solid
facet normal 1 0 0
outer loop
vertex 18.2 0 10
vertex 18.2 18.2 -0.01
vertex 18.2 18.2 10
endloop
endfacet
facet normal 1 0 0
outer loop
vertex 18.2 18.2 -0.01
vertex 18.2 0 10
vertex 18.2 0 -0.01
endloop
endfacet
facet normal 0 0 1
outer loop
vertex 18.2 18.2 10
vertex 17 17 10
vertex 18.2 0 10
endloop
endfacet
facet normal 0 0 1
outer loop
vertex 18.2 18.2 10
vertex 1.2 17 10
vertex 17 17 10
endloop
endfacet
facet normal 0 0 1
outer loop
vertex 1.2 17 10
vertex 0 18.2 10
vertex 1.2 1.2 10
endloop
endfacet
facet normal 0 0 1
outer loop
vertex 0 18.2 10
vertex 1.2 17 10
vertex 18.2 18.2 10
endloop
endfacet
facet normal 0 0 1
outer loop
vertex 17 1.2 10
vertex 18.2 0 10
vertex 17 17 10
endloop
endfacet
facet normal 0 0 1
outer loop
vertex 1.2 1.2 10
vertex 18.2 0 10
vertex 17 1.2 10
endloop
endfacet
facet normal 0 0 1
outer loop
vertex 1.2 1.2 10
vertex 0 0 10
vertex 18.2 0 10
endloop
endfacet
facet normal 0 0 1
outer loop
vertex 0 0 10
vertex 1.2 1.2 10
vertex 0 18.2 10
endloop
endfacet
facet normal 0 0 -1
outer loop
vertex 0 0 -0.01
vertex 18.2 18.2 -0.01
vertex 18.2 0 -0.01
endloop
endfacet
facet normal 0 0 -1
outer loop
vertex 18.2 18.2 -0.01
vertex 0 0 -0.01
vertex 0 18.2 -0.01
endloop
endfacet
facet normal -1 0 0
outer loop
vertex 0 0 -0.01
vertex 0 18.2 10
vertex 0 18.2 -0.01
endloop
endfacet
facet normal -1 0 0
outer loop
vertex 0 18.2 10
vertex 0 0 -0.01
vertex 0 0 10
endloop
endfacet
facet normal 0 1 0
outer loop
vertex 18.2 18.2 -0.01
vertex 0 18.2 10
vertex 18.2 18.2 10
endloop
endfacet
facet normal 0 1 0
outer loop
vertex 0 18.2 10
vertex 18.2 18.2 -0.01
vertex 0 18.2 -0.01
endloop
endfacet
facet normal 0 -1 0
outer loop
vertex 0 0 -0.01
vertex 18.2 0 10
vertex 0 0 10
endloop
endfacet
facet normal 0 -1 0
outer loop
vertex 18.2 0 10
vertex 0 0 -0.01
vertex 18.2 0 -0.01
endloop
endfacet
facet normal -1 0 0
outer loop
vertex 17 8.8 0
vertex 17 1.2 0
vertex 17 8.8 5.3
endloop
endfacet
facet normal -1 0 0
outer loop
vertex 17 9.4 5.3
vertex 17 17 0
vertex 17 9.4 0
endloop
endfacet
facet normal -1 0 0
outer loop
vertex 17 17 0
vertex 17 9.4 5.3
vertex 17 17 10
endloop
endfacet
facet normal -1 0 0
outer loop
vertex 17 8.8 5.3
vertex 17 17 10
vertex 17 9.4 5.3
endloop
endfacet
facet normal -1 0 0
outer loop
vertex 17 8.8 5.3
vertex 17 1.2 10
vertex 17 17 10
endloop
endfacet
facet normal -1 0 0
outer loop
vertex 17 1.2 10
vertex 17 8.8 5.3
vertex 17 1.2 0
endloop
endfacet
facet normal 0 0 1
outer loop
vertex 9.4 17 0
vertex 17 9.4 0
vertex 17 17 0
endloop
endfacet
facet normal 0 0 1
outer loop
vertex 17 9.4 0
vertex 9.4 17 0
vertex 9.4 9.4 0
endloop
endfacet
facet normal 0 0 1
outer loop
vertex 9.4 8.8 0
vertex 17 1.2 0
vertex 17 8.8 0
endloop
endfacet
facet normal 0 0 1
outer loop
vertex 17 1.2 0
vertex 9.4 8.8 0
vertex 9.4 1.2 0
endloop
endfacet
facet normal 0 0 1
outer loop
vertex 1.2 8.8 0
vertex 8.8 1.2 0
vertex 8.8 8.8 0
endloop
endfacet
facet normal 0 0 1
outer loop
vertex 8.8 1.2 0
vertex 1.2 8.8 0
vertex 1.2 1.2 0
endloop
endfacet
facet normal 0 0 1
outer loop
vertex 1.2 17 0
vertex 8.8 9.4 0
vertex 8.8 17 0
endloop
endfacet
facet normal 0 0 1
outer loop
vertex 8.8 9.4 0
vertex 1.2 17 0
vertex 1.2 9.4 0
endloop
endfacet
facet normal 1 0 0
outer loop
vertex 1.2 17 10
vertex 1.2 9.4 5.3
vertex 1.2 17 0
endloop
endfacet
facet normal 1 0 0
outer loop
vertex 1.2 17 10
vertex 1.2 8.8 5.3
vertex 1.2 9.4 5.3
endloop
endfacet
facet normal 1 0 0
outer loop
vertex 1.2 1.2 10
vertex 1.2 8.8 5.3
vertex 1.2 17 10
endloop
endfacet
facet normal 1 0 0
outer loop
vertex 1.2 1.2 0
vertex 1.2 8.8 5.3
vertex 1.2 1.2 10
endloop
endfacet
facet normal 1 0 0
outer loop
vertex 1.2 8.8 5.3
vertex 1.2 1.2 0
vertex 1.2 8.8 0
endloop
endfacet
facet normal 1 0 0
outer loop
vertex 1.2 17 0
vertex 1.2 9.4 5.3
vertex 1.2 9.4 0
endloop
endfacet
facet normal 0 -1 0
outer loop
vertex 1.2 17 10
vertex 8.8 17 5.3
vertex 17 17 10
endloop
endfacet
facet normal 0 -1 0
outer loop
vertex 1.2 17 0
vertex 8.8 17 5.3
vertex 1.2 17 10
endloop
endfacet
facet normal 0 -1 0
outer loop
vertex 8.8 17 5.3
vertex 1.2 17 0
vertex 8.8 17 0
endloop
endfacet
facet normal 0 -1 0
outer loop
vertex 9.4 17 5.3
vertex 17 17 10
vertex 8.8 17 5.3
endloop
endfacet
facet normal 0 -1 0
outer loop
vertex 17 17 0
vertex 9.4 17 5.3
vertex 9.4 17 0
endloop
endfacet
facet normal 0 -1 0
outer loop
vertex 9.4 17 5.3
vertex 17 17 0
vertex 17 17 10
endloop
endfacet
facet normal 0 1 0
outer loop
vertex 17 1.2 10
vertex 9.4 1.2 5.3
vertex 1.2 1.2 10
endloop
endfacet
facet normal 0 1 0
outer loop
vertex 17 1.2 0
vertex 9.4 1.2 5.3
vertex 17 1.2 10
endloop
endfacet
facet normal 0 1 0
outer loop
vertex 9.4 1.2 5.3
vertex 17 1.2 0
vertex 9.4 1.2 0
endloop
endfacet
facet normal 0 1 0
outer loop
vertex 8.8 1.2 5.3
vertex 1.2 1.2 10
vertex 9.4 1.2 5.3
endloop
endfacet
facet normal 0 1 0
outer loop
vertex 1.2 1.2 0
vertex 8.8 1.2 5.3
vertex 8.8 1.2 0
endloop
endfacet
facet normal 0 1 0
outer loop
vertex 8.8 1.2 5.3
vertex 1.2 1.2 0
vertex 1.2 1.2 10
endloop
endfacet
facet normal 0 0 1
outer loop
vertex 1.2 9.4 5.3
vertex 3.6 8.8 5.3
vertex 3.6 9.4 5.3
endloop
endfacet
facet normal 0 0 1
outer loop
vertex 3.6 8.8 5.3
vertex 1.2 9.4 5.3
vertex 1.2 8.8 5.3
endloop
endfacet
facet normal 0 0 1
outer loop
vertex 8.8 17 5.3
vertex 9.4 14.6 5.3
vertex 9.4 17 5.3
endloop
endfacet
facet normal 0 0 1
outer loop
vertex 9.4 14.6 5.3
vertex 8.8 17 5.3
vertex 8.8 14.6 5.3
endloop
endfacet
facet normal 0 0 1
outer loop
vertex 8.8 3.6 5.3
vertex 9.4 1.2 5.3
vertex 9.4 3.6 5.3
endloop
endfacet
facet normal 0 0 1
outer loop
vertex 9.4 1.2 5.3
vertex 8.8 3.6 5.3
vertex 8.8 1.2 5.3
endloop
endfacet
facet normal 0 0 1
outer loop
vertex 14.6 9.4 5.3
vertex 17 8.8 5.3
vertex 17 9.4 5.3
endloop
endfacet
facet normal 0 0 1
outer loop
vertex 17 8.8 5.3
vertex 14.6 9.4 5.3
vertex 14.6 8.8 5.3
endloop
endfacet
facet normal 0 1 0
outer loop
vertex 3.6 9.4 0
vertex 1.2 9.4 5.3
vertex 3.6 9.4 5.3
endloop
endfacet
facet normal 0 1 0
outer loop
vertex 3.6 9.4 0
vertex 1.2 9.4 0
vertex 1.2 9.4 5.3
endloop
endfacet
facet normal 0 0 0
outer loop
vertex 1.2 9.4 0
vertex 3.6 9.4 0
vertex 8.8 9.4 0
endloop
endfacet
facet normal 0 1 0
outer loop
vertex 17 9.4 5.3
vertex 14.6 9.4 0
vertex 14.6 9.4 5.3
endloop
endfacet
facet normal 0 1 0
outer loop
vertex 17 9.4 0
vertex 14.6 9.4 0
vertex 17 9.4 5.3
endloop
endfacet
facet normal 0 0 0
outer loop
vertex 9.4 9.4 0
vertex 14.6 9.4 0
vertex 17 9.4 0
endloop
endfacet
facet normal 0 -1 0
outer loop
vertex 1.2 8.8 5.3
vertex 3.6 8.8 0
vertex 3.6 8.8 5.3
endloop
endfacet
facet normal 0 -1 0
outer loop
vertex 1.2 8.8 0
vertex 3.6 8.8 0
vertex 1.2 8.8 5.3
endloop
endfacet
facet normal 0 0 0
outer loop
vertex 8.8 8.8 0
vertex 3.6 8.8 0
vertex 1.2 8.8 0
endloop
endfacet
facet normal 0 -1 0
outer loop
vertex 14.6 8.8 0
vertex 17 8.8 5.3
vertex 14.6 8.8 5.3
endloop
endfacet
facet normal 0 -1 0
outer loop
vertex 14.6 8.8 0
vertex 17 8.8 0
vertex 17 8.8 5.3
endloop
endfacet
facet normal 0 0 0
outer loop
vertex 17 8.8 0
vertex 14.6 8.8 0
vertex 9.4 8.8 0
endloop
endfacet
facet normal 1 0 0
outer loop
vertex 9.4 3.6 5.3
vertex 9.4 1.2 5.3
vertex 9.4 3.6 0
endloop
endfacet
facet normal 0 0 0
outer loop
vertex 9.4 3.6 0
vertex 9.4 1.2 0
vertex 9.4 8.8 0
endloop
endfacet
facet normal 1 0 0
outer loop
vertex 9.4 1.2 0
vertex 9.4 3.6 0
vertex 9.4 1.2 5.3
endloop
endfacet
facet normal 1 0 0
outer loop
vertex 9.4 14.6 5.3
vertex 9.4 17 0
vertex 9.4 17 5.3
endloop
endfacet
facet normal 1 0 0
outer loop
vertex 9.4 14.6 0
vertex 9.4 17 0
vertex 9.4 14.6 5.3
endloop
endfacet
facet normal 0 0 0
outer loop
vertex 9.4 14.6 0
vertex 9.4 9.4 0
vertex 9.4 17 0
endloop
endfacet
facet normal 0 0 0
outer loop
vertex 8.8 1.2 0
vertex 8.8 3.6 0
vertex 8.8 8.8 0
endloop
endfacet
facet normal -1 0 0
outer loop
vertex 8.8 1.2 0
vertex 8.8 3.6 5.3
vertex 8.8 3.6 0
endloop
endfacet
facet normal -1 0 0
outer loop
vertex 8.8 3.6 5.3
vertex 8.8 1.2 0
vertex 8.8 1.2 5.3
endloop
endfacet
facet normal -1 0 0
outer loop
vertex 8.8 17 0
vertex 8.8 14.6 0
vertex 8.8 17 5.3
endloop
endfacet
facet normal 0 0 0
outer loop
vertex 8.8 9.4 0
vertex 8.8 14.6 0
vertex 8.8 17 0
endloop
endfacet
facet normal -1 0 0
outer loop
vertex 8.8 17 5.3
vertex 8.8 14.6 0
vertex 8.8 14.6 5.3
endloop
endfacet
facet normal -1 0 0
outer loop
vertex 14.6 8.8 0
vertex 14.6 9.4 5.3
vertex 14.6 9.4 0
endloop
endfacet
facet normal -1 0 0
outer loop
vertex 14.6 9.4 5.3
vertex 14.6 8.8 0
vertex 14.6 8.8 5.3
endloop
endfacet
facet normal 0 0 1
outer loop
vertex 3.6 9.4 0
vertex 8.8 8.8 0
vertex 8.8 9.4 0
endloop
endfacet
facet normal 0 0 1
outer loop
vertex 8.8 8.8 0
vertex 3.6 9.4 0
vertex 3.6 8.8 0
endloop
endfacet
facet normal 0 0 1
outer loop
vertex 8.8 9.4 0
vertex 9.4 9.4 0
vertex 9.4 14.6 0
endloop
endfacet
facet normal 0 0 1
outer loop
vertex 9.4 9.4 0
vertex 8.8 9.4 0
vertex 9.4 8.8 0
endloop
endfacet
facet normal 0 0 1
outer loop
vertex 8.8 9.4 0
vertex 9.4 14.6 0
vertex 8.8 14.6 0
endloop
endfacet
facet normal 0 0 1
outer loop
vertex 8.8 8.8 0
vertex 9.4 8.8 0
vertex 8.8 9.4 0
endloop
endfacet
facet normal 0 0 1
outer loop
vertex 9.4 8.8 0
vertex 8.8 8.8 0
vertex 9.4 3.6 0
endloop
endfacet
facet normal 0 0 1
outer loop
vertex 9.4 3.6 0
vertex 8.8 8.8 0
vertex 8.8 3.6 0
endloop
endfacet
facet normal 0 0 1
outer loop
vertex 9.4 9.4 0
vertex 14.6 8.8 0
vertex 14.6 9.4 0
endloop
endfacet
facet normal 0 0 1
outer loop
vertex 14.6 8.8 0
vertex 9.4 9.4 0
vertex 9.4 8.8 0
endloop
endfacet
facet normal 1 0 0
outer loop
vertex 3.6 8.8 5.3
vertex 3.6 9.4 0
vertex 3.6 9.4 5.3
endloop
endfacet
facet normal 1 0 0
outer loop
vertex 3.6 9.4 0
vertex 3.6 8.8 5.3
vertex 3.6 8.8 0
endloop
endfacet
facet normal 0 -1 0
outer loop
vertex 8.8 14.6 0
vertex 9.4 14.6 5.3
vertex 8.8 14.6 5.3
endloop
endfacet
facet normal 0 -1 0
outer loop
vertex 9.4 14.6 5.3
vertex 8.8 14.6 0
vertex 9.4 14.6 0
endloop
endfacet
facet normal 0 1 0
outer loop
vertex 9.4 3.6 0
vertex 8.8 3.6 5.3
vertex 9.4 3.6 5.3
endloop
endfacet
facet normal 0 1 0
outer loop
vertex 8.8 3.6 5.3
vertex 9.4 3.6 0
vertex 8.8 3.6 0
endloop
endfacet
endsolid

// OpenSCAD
// file: ../Base/PlacementOptions.scad
// Fischertechnik Box Foundation
// Placement Options

// Alignment
NoAlign = 0;
AlignLeft = 1;
AlignBottom = 2;
AlignCenter = 3;
AlignRight = 4;
AlignTop = 5;

// Element rotation degree steps
rotations = [0, -90, -180, -270];

// Rotation
NoRotation = 0;
Rotate0 = 0;
Rotate90 = 1;
Rotate180 = 2;
Rotate270 = 3;

// Docking (seen from above)
NoDock = -1;
DockLeft = 0;
DockTop = 1;
DockRight = 2;
DockCorner = 2;
DockBottom = 3;

// Web corners
LowerLeft = 0;
UpperLeft = 1;
UpperRight = 2;
LowerRight = 3;

// Web position relative to corner
LeftOfCorner = 0;
RightOfCorner = 1;
// file: ../Base/Boxes.scad
// Fischertechnik Box Foundation
// Pre-designed Boxes

use <Constants.scad>

include <PlacementOptions.scad>

box190Width = 190;
box190Depth = 130;
box130Width = 130;
box130Depth = 95;
boxUsageHeight = 33.9;
boxWallThickness = 2.4;
boxBaseThickness = 1.0;

// getBoxWallThickness()
// Gets the wall thickness of a Fischertechnik Box

function getBoxWallThickness() = boxWallThickness;

// Gets the usable height of a fischertechnik box
function getBoxUsageHeight() = boxUsageHeight;

// Gets the thickness of the Fischertechnik box base.
function getBoxBaseThickness() = boxBaseThickness;

// Gets the usable inner space of a Box 190 as an x/y-list
function getBox190Space() = [
    box190Width - 2*getBoxWallThickness(), 
    box190Depth - 2*getBoxWallThickness() ];

// Imports the Fischertechnik empty box 130x190 mm and places it at position 0,0
// 190x130 are the outer sizes, the inner space is slightly smaller. Use getBox190Space() to get the inner sizes.
// This module needs the STL file "Fischertechnik Box 130x190.stl" in the library path.
// The box is positioned that the usable inner space is at the 0,0,0 position. The

module Box190() {
    translate([-getBoxWallThickness(),-getBoxWallThickness(),-getBoxBaseThickness()])
        import("Fischertechnik Box 130x190.stl", convexity=3);
}

// Gets the usable inner space of a Box 130 as an x/y-list
function getBox130Space() = [
    box130Width - 2*getBoxWallThickness(), 
    box130Depth - 2*getBoxWallThickness() ];

// Imports the Fischertechnik empty box 95x130 mm and places it at position 0,0
// 190x130 are the outer sizes, the inner space is slightly smaller. Use getBox190Space() to get the inner sizes.
// This module needs the STL file "Fischertechnik Box 95x130.stl" in the library path.
// The box is positioned that the usable inner space is at the 0,0,0 position. The

module Box130() {
    translate([-getBoxWallThickness(),-getBoxWallThickness(),-getBoxBaseThickness()])
        import("Fischertechnik Box 95x130.stl", convexity=3);
}

// Creates a web at the specified box walls
// corner 0 = LowerLeft, 1 = UpperLeft, 2 = UpperRight, 3 = LowerRight
// side 0 = LeftOfCorner, 1 = RightOfCorner
// distance = Distance in mm from the corner
// box = inner width and depth of the box (default: Box 190)
// webWidth = length of the web (default is 3 mms)
// webThickness = thickness of the web (default is 1 mm)

module BoxWeb(corner, side, distance, box=getBox190Space(), webWidth=3, webThickness=1.0) {
    sink = getBoxWallThickness()/2;

    width = (corner % 2 == 0) ? 
            (side == LeftOfCorner ? webWidth : webThickness) :
            (side == LeftOfCorner ? webThickness : webWidth);

    depth = (corner % 2 == 0) ? 
            (side == RightOfCorner ? webWidth : webThickness) :
            (side == RightOfCorner ? webThickness : webWidth);
    
    xDiff = corner == LowerLeft ? 
                (side == LeftOfCorner ? -sink : distance) :
            (corner == UpperLeft ?                
                (side == LeftOfCorner ? distance : -sink) :
            (corner == UpperRight ?
                (side == LeftOfCorner ? box.x-webWidth+sink : box.x-distance-webThickness) :
                (side == LeftOfCorner ? box.x-distance-webThickness: box.x-webWidth+sink)));

    yDiff = corner == LowerLeft ? 
                (side == RightOfCorner ? -sink : distance) :
            (corner == UpperLeft ?
                (side == RightOfCorner ? box.y-distance : box.y-webWidth+sink) :
            (corner == UpperRight ?
                (side == RightOfCorner ? box.y-webWidth+sink : box.y-distance) :
                (side == RightOfCorner ? distance : -sink)));
    
    translate([xDiff, yDiff, -getExcess()])
        cube([width, depth, boxUsageHeight + 2*getExcess()]);
}
// file: ../Base/Rotation.scad
// Fischertechnik Box Foundation
// Geometry Helpers Rotation

include <PlacementOptions.scad>

// getRotatedSpace(space, rotation=NoRotation)
// Rotates the space dependent on the specified rotation

function getRotatedSpace(space, rotation=NoRotation) = [
    (rotation == Rotate90 || rotation == Rotate270) ? space.y : space.x,
    (rotation == Rotate90 || rotation == Rotate270) ? space.x : space.y
];

// Rotates the given space around the fixed left lower corner
// space = the space the children needs as width/depth list [width,depth]
// rotation = 0 Rotate0 degrees, 1 Rotate90 degrees, 2 Rotate180 degrees, 3 Rotate270 degrees (equivalent to -90)

module RotateFix(space, rotation=Rotate0) {
    dy = (rotation == Rotate0 || rotation == Rotate270) ? 0 :
        (rotation == Rotate90) ? space.x :
        space.y;
    dx = (rotation < Rotate180) ? 0 :
        (rotation == Rotate180) ? space.x :
        space.y;
    
    translate([dx, dy, 0])
        rotate([0, 0, rotations[rotation]])
            children();
}
// file: ../Base/Alignment.scad
// Fischertechnik Box Foundation
// Geometry Helpers Alignment

include <PlacementOptions.scad>

// getAlignedX(elementWidth, spaceWidth, align=AlignRight, offset=0)
// Gets the aligned X offset of an element with the given
// width in the given space.
// elementWidth = The width of the element to positon
// spaceWidth = The space where the element should be aligned
// align = 0 AlignLeft, 1 AlignCenter, 2 AlignRight
// offset = an optional offset from the aligned position. When
// aligned left or centered, then positive values are in X direction.
// When aligned right then positive values are in negative X direction.

function getAlignedX(elementWidth, spaceWidth, align=AlignRight, offset=0) =
    (align == AlignLeft) ?
        offset :
        ((align == AlignCenter) ?
        (spaceWidth - elementWidth)/2 + offset :
        spaceWidth - offset - elementWidth);

// getAlignedY(elementDepth, spaceDepth, align=AlignTop, offset=0)
// Gets the aligned Y offset of an element with the given
// depth in the given space.
// elementDepth = The depth of the element to positon
// spaceDepth = The space where the element should be aligned
// align = 0 AlignBottom, 1 AlignCenter, 2 AlignTop
// offset = an optional offset from the aligned position. When
// aligned bottom or centered, then positive values are in Y direction.
// When aligned top then positive values are in negative Y direction.

function getAlignedY(elementDepth, spaceDepth, align=AlignTop, offset=0) =
    (align == AlignBottom) ?
        offset :
        ((align == AlignCenter) ?
        (spaceDepth - elementDepth)/2 + offset :
        spaceDepth - offset - elementDepth);
// file: ../Base/Placement.scad
// Fischertechnik Box Foundation
// Geometry Helpers Placement

use <Constants.scad>
use <Alignment.scad>
use <Rotation.scad>
use <Boxes.scad>

include <PlacementOptions.scad>

// Place(x=0, y=0, elementSpace=[0,0], alignX=AlignLeft, alignY=AlignBottom, rotation=Rotate0, boxSpace=getBox190Space())
// Places the child at the specified position
// y = Y-Position. This is a relative position when an X aligment is specified.
// x = X-Position. This is a relative position when an Y aligment is specified.
// elementSpace = space of the element to be placed [x,y]
// alignX = -1=NoAlign, 0 AlignLeft, 1 AlignCenter, 3 AlignRight (elementSpace and boxSpace required!)
// alignY = -1=NoAlign, 2 AlignBottom, 1 AlignCenter, 4 AlignTop (elementSpace and boxSpace required!)
// rotation = 0 Rotate0 0 degrees, 1 Rotate90 90 degrees, 
// 2 Rotate180 180 degrees, 3 Rotate270 270 degrees (equivalent to -90)
// boxSpace = Inner space of the box where the placement occurs [x,y] - default is Box 190x130 inner space

module Place(x=0, y=0, elementSpace=[0,0], 
  alignX=AlignLeft, alignY=AlignBottom, 
  rotation=NoRotation, boxSpace=getBox190Space()) {

    module Position(x, y, space, rotation=Rotate0) {
        translate([x, y, 0])
            RotateFix(space, rotation)
                children(0);
    }

    space = getRotatedSpace(elementSpace, rotation);
    alignedX = getAlignedX(space.x, boxSpace.x, alignX, x);
    alignedY = getAlignedY(space.y, boxSpace.y, alignY, y);
    Position(alignedX, alignedY, elementSpace, rotation)
        children(0);
}

// Center(space=getBox130Space(), elementSpace=[0,0])
// space = Space where the children is centered. For cylinder use centered=true and no elementSpace.
// elementSpace = space of the element to be centered [x,y]

module Center(space=getBox190Space(), elementSpace=[0,0]) {
    translate([(space.x - elementSpace.x) / 2, (space.y - elementSpace.y) / 2])
        children(0);
}

// CenterHorizontal(width=0, y=0, offset=0, space=getBox130Space())
// space = Space where the children is centered. For cylinder use centered=true and no elementSpace.
// elementSpace = space of the element to be centered [x,y]

module CenterHorizontal(width=0, y=0, offset=0, space=getBox190Space()) {
    translate([(space.x - width) / 2 + offset, y])
        children(0);
}

// CenterVertical(depth=0, x=0, offset=0, space=getBox130Space())
// space = Space where the children is centered. For cylinder use centered=true and no elementSpace.
// elementSpace = space of the element to be centered [x,y]

module CenterVerticalal(depth=0, x=0, offset=0, space=getBox190Space()) {
    translate([x, (space.y - depth) / 2 + offset])
        children(0);
}
// file: ../Base/Constants.scad
// Fischertechnik Box Foundation
// Constants

// Constant values necessary for multiple elements

// Base constants
dividerThickness = 1.2;
excess = 0.01;
fragments = 90;
tolerance = 0.8;

// Gets the thickness of a divider 
function getDividerThickness() = dividerThickness;

// Gets the excess that is used to merge walls into each other
function getExcess() = excess;

// Gets amount of fragments of a cylinder
function getFragments() = fragments;

// Gets the inner tolerance of a frame to each side
function getTolerance() = tolerance;


// Fischertechnik specific constants
axisDiameter = 4;
axisBottomDiameter = axisDiameter + 1;
standardEdgeDistance = 2.5;
standardWebDistance = 11.5;
standardCornerLength = 15;
tubeWallFactor = 1.6;

// Gets axis diameter
function getAxisDiameter() = axisDiameter;

// Gets axis bottom diameter for thicker part at the bottom
function getAxisBottomDiameter() = axisBottomDiameter;

// gets the standard distance to the wall of the box for dockable frames with webs
function getStandardEdgeDistance() = standardEdgeDistance;

// gets the standard distance of each web to the corner of the dockable frame
function getStandardWebDistance() = standardWebDistance;

// gets the standard length of the corner walls of a dockable frame
function getStandardCornerLength() = standardCornerLength;

// gets the wall thickness of a tube.
function getTubeWallThickness() = tubeWallFactor * getDividerThickness();
// main file
// Fischertechnik Box Library
// Frame for Light Cap
// 31316,31317,31318,31319,31320,31321,31362,36478,36531,36532

use <../Base/Constants.scad>
use <../Base/Placement.scad>
use <../ModelBase/Simple.scad>

width = 15;
depth = 15;
height = 10;

// getFrameLightCapSpace()
// Gets the space the frame for light cap needs as width (.x and .y as a list)

function getFrameLightCapSpace() = getFrameOuterVolume([width, depth, height]);

// FrameBlockWithPin(count)
// Frame for count standing building blocks with pin down

module FrameLightCap() {    
    webThickness = 0.6;
    webDepth = 2;
    webHeight = 5.3;
    
    innerVolume = getFrameInnerVolume([width, depth, height]);

    module InnerFrame() {
        Frame([width, depth, height]);
        
        Center(getFrameLightCapSpace(), [getFrameLightCapSpace().x, webThickness])
            Wall([getFrameLightCapSpace().x, webThickness, webHeight]);
        Center(getFrameLightCapSpace(), [webThickness, getFrameLightCapSpace().y])
            Wall([webThickness, getFrameLightCapSpace().y, webHeight]);
    }

    difference() {
        InnerFrame();
    
        cutoffWidth = width - 2*webDepth;
        cutoffDepth = depth - 2*webDepth;
        
        Center(getFrameLightCapSpace(), [cutoffWidth, cutoffDepth])
            cube([cutoffWidth, cutoffDepth, height]);
    }
}

// Test
color("lightgray") {
    FrameLightCap();
}
